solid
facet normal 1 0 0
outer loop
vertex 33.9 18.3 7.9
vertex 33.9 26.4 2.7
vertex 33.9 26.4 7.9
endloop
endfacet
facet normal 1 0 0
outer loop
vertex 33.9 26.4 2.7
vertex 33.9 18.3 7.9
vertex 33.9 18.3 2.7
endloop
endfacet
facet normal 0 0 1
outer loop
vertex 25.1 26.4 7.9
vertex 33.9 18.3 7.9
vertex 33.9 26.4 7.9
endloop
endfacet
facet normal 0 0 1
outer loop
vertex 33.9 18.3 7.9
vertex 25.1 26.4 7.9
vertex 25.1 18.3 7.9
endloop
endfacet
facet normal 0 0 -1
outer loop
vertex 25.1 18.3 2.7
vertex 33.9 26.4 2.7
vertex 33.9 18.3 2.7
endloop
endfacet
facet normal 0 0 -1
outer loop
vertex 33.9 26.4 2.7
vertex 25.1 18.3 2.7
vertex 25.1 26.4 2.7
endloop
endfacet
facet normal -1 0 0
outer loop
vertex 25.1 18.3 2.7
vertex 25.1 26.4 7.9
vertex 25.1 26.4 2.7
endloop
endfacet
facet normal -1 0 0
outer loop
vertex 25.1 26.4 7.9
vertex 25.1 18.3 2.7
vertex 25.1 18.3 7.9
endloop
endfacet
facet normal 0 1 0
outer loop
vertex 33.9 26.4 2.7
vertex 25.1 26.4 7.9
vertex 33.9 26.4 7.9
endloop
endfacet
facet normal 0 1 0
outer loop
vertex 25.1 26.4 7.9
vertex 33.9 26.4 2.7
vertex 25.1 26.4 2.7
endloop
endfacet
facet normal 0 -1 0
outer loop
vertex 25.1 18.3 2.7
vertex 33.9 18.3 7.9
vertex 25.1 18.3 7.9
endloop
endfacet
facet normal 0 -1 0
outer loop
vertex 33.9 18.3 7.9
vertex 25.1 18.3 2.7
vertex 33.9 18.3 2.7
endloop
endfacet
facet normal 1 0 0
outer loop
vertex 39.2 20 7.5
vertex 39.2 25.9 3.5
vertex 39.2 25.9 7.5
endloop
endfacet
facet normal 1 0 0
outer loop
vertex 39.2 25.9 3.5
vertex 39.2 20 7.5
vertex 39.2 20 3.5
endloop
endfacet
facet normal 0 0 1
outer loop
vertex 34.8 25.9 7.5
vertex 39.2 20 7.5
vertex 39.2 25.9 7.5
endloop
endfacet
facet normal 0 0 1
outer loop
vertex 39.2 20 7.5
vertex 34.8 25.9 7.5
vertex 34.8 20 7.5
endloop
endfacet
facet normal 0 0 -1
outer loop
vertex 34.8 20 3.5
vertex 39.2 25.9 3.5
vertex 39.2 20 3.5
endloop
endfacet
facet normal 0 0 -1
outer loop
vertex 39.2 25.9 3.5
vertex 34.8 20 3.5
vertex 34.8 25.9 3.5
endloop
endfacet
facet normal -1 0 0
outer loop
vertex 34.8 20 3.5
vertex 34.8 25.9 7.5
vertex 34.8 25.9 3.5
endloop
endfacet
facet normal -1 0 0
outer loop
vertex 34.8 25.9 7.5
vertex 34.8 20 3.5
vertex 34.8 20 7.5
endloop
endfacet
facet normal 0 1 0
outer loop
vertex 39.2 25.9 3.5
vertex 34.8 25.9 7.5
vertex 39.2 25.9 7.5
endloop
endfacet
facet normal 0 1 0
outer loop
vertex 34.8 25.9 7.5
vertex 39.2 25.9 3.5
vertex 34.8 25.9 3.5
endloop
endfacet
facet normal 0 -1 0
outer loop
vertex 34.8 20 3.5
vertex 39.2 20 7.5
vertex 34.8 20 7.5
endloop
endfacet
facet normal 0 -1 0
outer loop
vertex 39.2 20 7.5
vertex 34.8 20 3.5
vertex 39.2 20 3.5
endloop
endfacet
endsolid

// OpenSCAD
union() {
  translate([25.1, 18.3, 2.7]) cube(size=[8.8,8.1,5.2], center=false);
  translate([34.8, 20.0, 3.5]) cube(size=[4.4,5.9,4.0], center=false);
}
